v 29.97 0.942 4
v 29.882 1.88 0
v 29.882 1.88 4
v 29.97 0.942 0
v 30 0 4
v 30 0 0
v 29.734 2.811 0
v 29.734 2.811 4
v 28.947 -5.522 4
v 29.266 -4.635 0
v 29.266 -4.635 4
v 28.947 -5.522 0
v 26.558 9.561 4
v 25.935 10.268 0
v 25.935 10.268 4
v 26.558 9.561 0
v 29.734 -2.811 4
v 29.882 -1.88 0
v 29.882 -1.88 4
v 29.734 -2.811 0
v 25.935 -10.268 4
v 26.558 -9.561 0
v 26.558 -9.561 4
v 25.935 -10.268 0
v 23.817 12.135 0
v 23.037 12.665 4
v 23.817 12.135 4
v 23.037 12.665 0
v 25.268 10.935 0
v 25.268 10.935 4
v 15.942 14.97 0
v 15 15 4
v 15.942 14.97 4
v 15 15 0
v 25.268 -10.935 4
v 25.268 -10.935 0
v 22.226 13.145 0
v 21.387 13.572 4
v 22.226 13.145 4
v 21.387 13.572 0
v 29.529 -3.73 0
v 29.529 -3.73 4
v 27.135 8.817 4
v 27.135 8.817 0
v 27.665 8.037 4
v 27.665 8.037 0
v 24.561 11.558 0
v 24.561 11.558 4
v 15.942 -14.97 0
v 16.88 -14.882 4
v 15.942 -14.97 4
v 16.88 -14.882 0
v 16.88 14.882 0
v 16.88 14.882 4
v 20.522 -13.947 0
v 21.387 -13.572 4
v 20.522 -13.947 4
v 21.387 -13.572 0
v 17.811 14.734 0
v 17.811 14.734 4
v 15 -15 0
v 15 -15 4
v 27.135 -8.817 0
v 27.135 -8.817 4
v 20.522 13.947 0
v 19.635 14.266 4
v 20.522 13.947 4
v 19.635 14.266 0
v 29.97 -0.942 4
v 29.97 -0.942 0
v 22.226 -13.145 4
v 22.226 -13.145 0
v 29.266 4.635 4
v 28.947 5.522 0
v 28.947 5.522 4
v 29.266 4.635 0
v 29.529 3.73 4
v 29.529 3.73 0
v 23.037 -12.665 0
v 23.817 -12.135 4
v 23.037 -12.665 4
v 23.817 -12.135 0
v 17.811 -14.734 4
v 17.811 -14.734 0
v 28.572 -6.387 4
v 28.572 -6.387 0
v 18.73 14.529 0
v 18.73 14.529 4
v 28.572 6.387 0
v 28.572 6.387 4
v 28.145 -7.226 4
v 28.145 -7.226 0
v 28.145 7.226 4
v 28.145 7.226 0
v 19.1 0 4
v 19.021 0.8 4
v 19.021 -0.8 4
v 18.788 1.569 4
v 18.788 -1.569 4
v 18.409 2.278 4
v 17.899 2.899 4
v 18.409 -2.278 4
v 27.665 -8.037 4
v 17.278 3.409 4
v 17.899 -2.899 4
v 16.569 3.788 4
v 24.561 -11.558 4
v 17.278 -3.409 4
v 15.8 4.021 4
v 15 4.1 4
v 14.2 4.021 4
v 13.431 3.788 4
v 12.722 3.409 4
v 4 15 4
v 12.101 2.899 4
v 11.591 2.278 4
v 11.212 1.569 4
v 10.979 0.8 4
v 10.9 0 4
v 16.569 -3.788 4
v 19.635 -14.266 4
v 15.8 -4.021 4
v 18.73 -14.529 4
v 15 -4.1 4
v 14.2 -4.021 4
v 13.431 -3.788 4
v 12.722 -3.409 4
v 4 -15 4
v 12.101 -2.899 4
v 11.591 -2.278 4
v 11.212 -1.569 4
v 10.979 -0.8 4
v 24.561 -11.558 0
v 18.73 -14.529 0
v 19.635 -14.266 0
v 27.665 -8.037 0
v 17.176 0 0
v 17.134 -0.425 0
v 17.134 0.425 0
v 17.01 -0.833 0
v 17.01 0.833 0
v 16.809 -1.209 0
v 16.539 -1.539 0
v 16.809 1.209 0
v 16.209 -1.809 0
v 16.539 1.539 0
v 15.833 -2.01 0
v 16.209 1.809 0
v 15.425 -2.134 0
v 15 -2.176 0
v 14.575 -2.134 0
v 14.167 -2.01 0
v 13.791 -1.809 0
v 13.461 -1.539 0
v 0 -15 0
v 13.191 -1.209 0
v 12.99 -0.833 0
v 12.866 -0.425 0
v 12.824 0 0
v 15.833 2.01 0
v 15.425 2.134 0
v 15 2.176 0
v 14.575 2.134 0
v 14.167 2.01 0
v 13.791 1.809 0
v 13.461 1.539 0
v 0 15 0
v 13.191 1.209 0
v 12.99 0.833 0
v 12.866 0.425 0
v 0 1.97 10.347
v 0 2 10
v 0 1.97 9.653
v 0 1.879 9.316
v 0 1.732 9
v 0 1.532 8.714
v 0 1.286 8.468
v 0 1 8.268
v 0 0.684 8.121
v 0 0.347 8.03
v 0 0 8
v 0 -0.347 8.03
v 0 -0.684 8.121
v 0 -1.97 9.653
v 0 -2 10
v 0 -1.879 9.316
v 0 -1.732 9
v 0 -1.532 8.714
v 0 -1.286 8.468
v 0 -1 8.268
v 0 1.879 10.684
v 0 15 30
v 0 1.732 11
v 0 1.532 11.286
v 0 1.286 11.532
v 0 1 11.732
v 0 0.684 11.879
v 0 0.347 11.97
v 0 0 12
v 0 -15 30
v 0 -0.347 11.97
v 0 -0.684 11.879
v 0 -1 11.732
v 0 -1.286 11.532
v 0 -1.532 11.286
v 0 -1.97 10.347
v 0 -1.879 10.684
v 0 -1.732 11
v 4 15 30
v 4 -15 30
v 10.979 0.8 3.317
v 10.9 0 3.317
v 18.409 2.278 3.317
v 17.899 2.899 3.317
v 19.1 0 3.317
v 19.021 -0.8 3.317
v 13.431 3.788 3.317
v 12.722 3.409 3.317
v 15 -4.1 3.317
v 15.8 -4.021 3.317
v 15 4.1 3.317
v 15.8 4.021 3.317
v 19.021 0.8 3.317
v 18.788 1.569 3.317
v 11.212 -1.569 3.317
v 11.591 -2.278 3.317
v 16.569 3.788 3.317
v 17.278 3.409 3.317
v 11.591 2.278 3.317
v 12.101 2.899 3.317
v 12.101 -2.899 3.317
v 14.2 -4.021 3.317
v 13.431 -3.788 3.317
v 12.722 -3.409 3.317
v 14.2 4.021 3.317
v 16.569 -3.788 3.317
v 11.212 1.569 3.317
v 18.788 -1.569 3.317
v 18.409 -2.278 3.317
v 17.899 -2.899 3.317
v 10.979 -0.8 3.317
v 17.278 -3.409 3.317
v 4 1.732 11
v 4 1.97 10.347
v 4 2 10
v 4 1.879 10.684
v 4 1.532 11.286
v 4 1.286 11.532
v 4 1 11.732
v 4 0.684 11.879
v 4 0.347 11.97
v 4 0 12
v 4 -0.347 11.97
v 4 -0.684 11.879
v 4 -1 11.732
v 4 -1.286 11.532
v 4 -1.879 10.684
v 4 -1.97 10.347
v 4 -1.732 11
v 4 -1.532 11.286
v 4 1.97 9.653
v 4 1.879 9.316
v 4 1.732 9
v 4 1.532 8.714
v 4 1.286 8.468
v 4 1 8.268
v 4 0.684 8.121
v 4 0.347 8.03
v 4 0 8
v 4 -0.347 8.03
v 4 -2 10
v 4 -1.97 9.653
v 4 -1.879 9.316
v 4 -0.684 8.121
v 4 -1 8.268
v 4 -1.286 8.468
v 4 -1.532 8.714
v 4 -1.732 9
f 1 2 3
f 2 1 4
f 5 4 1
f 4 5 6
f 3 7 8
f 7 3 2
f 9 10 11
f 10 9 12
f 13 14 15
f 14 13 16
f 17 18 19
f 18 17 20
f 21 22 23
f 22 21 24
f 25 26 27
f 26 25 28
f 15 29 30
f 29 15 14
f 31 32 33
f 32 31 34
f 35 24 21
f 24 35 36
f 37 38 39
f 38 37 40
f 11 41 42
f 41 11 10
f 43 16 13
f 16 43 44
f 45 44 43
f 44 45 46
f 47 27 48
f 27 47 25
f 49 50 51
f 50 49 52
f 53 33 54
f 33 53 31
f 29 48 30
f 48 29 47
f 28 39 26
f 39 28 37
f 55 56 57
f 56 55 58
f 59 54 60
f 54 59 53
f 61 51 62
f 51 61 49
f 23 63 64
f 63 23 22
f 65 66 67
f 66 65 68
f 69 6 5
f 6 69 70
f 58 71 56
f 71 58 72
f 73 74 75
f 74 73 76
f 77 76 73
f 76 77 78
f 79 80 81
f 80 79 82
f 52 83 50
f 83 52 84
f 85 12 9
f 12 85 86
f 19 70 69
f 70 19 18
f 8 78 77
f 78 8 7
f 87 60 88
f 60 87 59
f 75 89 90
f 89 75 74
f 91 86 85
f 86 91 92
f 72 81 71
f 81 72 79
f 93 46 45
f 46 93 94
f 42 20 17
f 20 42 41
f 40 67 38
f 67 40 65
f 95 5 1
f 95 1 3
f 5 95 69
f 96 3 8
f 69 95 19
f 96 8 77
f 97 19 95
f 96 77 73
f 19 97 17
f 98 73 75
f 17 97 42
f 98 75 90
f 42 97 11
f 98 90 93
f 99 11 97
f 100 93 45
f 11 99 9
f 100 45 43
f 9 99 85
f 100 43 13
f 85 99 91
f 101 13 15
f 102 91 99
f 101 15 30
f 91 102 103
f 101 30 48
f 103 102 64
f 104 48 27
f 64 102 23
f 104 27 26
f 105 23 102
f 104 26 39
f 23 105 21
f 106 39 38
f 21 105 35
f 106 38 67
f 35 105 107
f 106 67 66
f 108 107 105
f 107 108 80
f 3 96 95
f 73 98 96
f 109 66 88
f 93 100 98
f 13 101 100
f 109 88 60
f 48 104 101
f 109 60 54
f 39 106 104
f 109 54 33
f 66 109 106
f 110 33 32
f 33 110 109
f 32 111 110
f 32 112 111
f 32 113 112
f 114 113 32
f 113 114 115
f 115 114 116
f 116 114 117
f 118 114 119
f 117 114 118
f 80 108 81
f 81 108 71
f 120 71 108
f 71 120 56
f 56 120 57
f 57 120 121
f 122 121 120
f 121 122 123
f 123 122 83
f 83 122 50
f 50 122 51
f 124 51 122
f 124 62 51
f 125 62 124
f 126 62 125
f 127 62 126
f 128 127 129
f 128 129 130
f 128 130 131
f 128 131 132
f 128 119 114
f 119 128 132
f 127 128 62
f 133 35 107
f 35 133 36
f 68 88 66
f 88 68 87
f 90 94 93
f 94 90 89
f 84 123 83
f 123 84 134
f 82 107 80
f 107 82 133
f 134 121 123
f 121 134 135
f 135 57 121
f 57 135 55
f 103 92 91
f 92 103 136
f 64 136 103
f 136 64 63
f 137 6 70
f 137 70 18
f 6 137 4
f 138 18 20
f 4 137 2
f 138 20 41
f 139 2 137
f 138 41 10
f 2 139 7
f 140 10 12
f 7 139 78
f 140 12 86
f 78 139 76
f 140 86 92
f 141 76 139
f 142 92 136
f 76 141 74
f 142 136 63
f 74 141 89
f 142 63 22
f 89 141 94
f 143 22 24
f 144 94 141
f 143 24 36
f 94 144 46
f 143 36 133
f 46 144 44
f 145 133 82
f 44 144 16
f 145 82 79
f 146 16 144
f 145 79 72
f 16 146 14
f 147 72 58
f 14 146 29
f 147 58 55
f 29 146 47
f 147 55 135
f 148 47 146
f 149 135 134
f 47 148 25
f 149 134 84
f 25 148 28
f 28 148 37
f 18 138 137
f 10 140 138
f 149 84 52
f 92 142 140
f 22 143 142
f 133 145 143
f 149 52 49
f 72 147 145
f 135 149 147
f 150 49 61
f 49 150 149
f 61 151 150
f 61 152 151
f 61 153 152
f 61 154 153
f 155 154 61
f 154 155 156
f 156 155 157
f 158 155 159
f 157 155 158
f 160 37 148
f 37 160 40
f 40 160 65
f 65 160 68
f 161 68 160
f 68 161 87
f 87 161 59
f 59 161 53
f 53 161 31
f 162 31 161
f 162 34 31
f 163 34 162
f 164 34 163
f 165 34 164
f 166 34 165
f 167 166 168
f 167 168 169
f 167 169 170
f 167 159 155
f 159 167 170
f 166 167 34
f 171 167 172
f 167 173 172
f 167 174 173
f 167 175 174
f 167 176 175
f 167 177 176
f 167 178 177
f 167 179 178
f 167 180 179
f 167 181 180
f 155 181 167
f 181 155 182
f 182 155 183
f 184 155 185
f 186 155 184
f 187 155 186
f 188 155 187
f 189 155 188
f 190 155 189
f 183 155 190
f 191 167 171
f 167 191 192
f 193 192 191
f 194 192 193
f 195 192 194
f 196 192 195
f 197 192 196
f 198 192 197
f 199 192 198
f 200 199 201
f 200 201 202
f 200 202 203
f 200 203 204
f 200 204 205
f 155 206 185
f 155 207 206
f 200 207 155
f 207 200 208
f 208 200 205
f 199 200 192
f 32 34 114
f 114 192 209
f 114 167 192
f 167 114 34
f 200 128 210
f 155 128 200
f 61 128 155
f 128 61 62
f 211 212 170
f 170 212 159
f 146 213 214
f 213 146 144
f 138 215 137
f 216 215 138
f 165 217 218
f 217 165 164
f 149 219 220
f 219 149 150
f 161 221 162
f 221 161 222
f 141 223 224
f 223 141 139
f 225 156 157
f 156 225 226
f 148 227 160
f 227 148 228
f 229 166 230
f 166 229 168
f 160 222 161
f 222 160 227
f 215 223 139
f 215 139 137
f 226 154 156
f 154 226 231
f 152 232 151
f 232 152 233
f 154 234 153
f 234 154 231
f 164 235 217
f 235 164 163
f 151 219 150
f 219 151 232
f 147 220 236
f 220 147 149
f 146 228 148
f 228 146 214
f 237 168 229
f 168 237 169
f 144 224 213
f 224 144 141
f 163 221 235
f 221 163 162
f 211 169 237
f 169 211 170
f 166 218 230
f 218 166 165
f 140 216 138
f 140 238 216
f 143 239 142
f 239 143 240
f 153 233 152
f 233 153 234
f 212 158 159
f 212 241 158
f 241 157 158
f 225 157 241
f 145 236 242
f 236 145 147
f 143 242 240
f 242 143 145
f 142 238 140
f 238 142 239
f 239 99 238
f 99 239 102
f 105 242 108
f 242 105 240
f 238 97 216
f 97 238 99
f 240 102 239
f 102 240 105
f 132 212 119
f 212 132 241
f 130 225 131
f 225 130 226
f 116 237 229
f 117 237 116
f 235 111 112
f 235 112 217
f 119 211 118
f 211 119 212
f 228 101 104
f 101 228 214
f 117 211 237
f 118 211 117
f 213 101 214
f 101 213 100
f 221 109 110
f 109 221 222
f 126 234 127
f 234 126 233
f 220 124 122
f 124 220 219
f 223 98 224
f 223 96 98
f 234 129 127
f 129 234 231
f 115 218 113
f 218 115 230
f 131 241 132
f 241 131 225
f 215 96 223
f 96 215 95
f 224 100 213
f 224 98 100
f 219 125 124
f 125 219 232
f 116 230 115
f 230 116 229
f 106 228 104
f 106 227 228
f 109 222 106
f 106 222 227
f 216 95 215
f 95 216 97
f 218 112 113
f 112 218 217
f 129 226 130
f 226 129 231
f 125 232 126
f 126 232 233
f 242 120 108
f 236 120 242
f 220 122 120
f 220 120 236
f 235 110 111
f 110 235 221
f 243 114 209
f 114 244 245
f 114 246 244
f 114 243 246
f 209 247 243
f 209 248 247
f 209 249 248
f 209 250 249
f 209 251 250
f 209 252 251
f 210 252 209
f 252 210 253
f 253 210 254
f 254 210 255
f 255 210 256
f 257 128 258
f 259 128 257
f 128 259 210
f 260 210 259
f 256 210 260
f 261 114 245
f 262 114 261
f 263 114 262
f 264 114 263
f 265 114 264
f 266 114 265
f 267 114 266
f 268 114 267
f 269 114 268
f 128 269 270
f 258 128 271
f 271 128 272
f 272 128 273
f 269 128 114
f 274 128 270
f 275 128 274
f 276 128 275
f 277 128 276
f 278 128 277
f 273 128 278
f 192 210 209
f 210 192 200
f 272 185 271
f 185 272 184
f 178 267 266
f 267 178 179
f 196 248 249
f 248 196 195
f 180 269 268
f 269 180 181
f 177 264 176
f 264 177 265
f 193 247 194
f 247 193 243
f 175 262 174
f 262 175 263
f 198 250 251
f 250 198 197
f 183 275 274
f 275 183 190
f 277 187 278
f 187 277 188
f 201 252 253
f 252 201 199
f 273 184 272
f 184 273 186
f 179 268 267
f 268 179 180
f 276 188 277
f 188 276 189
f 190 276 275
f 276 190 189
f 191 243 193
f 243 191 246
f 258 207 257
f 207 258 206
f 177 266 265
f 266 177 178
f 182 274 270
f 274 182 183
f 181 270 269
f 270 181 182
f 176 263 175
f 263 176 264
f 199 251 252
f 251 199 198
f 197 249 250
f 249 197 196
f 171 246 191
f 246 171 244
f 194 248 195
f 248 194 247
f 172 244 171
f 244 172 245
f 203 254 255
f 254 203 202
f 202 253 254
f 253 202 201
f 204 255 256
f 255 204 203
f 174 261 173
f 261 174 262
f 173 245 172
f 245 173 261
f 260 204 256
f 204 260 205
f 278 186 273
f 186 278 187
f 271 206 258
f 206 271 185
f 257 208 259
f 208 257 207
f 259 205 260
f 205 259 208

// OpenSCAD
bracket_joint_length = 30;

screw_pad_width = 30;
screw_pad_thickness = 4;

vert_pad_height = 30;
vert_pad_thickness = 4;

vert_hole_center_height = 10;
vert_hole_diameter = 4;

include <ScrewTab.scad>

make();

module make() {
    align_vertical = vert_hole_center_height-vert_pad_height/2;
    
    screw_tab(8,screw_pad_thickness,4.1,60,screw_pad_width-8);
    difference() {
        translate([vert_pad_thickness/2,0,vert_pad_height/2])
            cube([vert_pad_thickness,bracket_joint_length,vert_pad_height], true);  
        translate([-1,0,vert_hole_center_height])
            rotate([0,90,0])
                cylinder(vert_pad_thickness+2,d=vert_hole_diameter,true,$fn=36);
    }
}
